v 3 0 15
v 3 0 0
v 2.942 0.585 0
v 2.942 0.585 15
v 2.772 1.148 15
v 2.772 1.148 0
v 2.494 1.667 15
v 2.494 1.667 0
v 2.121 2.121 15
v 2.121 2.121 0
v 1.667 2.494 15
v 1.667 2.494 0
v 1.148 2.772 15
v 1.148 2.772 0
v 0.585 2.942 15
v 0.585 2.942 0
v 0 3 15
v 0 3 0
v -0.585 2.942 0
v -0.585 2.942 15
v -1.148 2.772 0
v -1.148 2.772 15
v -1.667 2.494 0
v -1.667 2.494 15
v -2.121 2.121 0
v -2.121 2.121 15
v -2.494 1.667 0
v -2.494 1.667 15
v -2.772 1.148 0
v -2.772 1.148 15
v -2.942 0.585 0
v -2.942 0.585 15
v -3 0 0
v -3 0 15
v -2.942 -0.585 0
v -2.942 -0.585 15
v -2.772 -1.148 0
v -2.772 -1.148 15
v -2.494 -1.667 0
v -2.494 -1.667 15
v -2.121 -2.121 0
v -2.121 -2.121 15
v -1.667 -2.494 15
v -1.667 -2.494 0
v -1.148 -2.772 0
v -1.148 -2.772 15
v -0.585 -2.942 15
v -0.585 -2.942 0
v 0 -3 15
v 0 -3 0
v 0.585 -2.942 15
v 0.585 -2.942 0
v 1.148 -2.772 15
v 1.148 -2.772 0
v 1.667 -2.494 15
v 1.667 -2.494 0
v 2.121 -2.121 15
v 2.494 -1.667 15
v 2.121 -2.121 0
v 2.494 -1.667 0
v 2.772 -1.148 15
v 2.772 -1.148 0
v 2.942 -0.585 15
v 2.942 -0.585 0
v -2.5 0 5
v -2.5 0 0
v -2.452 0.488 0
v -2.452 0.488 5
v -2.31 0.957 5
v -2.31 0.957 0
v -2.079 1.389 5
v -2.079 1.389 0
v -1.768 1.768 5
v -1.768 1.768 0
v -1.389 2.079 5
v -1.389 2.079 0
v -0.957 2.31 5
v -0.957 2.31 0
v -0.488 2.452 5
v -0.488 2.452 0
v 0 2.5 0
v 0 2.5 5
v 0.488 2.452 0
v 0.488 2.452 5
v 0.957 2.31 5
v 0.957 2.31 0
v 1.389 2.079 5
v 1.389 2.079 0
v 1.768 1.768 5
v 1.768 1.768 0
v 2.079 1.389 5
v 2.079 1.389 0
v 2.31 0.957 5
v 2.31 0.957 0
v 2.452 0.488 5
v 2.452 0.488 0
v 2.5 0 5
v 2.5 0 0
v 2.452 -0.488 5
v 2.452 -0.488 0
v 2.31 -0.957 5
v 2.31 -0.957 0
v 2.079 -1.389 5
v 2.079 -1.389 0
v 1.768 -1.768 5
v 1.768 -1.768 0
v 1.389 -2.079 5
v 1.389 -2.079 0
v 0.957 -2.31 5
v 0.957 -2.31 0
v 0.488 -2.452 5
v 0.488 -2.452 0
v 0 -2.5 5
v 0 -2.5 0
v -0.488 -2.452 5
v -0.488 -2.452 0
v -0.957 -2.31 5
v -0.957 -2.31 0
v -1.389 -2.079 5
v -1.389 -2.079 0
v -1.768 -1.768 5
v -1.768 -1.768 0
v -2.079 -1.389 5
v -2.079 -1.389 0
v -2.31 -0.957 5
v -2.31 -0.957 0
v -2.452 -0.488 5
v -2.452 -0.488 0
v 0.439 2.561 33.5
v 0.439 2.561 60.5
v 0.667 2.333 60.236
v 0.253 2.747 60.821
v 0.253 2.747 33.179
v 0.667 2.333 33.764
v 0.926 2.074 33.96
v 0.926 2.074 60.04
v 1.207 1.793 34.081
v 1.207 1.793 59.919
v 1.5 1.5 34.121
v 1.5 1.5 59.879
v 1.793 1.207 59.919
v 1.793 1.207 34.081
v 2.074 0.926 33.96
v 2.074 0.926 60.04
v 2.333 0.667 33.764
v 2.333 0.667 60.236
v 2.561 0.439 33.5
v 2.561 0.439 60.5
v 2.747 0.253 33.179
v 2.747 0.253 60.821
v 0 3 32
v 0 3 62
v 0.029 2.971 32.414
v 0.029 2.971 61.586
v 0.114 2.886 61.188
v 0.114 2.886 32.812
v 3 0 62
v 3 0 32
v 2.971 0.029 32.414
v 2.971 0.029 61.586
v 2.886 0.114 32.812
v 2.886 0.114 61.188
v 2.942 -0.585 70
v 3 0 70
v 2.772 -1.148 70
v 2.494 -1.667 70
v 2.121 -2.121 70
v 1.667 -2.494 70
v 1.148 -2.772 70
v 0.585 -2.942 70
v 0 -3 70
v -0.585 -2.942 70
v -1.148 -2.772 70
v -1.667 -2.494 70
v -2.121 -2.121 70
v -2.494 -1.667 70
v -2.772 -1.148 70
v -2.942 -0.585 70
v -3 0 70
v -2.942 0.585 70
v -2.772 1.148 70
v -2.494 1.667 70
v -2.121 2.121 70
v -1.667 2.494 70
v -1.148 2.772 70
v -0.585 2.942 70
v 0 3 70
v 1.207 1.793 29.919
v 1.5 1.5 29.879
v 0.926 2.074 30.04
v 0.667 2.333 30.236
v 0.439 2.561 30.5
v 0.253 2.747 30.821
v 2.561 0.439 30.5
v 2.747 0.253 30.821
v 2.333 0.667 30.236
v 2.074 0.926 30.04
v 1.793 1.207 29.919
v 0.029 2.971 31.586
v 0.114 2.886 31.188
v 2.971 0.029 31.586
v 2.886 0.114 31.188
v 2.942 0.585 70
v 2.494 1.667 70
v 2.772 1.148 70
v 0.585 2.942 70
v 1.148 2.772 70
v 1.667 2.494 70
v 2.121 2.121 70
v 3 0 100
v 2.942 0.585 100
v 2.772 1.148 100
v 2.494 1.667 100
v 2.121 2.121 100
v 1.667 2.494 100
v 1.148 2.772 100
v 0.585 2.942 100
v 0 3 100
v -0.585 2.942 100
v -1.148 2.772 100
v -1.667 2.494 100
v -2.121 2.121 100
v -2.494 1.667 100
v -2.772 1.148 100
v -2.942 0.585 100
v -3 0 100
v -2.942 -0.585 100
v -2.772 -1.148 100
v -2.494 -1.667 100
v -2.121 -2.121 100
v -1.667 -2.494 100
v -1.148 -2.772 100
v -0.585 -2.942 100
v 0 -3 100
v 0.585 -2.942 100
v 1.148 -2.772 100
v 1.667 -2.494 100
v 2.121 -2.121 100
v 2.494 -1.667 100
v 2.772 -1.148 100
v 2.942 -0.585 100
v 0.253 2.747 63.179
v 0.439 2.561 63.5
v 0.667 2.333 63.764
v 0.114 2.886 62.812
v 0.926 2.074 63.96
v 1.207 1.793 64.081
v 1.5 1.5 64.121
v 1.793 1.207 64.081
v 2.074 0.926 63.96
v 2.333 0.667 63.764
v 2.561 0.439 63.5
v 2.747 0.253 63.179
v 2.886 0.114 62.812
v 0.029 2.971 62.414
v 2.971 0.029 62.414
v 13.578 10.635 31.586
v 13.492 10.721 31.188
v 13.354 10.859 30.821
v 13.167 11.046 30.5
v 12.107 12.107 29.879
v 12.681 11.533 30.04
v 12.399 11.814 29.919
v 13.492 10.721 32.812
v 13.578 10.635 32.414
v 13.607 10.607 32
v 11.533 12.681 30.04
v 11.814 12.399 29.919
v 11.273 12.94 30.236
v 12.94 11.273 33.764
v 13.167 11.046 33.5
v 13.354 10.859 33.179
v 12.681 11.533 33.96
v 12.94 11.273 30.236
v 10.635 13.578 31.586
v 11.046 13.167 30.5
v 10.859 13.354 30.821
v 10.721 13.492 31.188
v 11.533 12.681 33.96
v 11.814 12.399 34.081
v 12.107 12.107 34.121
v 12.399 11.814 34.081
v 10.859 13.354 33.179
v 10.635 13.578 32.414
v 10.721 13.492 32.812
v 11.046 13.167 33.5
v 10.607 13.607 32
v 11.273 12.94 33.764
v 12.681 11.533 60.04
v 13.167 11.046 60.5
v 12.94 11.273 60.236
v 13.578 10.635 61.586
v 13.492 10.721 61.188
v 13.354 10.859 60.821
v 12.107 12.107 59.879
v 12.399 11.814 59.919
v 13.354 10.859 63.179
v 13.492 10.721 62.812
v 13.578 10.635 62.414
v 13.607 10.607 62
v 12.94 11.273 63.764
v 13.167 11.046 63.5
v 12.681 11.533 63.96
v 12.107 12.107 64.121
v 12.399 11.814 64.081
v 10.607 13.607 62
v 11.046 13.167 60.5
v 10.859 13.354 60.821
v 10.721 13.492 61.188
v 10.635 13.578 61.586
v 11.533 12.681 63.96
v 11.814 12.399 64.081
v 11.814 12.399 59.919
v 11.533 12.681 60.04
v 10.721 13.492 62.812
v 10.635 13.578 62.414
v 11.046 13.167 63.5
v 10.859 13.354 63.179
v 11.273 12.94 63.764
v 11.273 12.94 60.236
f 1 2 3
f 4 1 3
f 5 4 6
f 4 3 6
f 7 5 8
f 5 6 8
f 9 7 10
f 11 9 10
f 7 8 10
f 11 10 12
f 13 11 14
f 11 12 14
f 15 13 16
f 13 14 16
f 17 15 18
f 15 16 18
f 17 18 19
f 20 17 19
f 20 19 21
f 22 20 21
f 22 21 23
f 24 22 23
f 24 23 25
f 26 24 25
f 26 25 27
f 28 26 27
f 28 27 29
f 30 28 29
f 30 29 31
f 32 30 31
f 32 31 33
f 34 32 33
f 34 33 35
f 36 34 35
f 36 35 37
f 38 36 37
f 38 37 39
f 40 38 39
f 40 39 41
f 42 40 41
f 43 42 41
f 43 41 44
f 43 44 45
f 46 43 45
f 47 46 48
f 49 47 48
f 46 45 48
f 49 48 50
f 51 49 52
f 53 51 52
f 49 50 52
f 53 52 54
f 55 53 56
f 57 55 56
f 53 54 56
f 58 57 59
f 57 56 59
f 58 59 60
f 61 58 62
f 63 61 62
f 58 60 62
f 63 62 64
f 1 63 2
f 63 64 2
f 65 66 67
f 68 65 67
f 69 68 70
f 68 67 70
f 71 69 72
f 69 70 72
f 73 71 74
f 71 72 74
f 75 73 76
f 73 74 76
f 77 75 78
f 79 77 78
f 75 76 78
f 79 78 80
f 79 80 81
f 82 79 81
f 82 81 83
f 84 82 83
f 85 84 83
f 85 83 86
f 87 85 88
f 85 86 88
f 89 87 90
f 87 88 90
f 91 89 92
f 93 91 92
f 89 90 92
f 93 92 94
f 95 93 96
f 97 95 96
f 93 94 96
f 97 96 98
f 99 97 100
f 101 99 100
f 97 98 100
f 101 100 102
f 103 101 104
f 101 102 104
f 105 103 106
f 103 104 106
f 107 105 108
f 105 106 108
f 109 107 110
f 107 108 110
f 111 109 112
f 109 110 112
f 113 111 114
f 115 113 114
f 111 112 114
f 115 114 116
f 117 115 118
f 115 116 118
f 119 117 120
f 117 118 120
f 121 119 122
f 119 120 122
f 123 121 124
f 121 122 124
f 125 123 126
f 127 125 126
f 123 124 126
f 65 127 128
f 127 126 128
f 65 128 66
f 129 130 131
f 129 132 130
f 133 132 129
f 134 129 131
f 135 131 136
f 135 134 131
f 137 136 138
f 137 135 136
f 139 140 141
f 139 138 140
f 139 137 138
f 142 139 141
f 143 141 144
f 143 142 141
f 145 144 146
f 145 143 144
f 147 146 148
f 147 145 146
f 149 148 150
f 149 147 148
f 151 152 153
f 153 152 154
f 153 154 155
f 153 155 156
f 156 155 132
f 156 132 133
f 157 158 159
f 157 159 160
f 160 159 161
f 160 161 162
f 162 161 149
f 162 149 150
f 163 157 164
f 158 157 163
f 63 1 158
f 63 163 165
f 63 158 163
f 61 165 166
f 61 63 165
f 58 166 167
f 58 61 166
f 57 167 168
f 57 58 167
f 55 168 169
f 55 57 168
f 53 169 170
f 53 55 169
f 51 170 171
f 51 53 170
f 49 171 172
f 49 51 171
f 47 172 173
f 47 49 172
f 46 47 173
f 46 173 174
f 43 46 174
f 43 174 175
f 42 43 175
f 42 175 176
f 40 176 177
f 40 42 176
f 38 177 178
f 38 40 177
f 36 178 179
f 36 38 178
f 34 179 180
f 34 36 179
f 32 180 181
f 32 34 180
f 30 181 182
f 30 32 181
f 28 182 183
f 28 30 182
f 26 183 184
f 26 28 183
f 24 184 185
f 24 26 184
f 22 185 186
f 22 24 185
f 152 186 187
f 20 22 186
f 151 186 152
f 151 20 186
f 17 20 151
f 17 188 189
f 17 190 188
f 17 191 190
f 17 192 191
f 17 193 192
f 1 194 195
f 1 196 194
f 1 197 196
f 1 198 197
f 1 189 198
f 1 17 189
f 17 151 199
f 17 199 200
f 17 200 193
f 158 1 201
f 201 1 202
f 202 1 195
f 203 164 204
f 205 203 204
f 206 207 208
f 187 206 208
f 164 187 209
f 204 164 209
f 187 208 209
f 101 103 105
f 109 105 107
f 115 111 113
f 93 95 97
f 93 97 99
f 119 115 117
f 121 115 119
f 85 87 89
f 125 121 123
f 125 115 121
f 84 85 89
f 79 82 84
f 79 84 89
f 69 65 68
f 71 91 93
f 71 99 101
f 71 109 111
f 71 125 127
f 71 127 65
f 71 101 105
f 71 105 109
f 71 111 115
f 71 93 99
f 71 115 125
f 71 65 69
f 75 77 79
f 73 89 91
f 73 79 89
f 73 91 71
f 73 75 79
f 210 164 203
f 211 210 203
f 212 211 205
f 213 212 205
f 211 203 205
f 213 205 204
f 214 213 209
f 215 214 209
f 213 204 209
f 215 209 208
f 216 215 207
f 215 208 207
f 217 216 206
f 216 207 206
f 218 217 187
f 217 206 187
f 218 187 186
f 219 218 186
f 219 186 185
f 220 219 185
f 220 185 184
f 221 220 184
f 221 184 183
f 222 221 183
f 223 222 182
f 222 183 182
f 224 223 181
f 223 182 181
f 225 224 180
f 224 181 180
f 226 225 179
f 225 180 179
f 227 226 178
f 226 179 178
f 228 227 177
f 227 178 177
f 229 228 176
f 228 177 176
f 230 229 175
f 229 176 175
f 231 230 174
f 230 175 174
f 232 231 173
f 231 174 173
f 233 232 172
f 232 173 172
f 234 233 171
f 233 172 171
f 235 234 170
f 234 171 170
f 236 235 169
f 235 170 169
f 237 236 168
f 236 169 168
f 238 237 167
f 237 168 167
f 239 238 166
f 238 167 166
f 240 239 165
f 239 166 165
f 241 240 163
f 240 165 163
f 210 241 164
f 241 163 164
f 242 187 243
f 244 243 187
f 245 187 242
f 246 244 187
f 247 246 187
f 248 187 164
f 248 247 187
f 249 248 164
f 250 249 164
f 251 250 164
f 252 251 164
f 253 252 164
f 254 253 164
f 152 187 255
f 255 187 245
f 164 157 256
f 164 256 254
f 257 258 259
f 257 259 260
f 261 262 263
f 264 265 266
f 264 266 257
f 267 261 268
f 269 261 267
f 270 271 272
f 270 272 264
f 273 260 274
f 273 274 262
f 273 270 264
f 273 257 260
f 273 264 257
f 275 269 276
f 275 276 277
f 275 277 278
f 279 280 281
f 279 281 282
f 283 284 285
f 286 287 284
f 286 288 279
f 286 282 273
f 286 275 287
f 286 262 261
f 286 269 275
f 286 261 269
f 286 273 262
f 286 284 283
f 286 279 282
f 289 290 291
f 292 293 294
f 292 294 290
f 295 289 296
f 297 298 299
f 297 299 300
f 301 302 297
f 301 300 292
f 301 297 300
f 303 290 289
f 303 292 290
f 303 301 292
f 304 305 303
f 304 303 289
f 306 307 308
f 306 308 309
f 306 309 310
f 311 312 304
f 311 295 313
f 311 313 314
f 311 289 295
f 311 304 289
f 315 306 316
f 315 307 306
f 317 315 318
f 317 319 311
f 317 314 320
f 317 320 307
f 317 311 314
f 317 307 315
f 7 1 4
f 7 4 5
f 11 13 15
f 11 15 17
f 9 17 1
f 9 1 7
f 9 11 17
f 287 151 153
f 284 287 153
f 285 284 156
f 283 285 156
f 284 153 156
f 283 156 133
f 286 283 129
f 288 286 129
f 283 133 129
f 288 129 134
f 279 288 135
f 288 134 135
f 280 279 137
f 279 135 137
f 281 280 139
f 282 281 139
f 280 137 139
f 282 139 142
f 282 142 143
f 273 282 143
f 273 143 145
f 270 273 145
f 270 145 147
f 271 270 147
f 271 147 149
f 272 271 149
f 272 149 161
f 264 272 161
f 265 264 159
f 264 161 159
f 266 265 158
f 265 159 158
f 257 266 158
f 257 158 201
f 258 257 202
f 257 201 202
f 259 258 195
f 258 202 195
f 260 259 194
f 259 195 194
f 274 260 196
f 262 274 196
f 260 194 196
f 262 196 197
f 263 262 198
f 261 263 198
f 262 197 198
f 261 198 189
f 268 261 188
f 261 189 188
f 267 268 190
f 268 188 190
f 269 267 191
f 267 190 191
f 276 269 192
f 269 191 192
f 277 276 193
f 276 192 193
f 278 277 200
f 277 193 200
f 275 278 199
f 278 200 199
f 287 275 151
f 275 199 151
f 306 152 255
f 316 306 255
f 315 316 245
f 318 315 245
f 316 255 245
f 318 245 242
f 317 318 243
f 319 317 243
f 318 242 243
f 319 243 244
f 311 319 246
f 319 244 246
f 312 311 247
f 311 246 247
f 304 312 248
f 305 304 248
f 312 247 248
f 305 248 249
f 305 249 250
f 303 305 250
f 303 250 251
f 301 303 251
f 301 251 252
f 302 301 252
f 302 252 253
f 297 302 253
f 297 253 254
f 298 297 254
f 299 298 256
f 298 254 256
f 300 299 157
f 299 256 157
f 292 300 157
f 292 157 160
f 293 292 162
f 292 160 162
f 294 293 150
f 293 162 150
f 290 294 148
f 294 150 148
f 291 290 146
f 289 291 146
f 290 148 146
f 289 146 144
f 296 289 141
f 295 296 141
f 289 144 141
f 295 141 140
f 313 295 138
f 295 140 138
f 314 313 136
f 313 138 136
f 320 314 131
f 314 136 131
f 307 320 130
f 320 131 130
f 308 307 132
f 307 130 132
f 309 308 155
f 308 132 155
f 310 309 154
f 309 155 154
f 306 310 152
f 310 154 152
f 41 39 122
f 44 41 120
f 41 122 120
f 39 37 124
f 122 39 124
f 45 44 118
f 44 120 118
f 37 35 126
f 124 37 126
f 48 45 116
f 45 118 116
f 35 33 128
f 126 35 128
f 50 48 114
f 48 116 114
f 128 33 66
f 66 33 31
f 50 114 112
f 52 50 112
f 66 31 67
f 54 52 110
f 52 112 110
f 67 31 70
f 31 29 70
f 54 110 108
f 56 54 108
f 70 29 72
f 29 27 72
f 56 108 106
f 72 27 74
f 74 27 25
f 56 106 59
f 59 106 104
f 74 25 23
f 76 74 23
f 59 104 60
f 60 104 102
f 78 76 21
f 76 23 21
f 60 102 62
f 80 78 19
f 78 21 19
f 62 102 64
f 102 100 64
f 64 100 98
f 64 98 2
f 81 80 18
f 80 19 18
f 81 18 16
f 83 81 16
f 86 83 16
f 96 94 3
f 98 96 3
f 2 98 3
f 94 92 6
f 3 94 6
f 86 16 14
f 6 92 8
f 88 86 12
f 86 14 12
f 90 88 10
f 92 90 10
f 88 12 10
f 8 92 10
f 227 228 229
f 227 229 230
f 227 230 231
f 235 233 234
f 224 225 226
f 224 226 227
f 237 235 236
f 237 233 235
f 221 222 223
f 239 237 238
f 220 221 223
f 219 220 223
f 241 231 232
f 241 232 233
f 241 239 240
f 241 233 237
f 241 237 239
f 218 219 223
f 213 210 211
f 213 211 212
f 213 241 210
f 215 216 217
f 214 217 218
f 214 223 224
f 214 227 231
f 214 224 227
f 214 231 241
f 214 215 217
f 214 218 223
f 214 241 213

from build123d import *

# Parameters (mm, degrees)
ESQUISSE1_R             = 3
BOSS_EXTRU_1_DEPTH      = 15
ESQUISSE2_R             = 2.5
ENL_V_MAT_EXTRU_1_DEPTH = 5
BOSS_EXTRU_2_DEPTH      = 55
ESQUISSE4_R             = 2.121320344
BOSS_EXTRU_3_DEPTH      = 15
ESQUISSE5_R             = 3
BOSS_EXTRU_4_DEPTH      = 30


with BuildPart() as part:
    # Esquisse1 → Boss.-Extru.1 (new body)
    with BuildSketch(Plane.XY):
        Circle(ESQUISSE1_R)
    extrude(amount=BOSS_EXTRU_1_DEPTH)

    # Esquisse2 → Enlèv. mat.-Extru.1 (cut)
    with BuildSketch(Plane(origin=(0, 0, 0), x_dir=(-1, 0, 0), z_dir=(0, 0, -1))):
        Circle(ESQUISSE2_R)
    extrude(amount=-ENL_V_MAT_EXTRU_1_DEPTH, mode=Mode.SUBTRACT)

    # Esquisse3 → Boss.-Extru.2 (add)
    with BuildSketch(Plane.XY.offset(15)):
        with BuildLine():
            Line((0, 3), (3, 0))
            ThreePointArc((3, 0), (-2.121320344, -2.121320344), (0, 3))
        make_face()
    extrude(amount=BOSS_EXTRU_2_DEPTH)

    # Esquisse4 → Boss.-Extru.3 (add)
    with BuildSketch(Plane(origin=(1.5, 1.5, 0), x_dir=(0, 0, -1), z_dir=(0.7071067811865477, 0.7071067811865475, 0))):
        with Locations(Location((-62, 0, 0), (0, 0, 90))):
            Circle(ESQUISSE4_R)
        with Locations(Location((-32, 0, 0), (0, 0, 90))):
            Circle(ESQUISSE4_R)
    extrude(amount=BOSS_EXTRU_3_DEPTH)

    # Esquisse5 → Boss.-Extru.4 (add)
    with BuildSketch(Plane.XY.offset(70)):
        Circle(ESQUISSE5_R)
    extrude(amount=BOSS_EXTRU_4_DEPTH)


solid = part.part
